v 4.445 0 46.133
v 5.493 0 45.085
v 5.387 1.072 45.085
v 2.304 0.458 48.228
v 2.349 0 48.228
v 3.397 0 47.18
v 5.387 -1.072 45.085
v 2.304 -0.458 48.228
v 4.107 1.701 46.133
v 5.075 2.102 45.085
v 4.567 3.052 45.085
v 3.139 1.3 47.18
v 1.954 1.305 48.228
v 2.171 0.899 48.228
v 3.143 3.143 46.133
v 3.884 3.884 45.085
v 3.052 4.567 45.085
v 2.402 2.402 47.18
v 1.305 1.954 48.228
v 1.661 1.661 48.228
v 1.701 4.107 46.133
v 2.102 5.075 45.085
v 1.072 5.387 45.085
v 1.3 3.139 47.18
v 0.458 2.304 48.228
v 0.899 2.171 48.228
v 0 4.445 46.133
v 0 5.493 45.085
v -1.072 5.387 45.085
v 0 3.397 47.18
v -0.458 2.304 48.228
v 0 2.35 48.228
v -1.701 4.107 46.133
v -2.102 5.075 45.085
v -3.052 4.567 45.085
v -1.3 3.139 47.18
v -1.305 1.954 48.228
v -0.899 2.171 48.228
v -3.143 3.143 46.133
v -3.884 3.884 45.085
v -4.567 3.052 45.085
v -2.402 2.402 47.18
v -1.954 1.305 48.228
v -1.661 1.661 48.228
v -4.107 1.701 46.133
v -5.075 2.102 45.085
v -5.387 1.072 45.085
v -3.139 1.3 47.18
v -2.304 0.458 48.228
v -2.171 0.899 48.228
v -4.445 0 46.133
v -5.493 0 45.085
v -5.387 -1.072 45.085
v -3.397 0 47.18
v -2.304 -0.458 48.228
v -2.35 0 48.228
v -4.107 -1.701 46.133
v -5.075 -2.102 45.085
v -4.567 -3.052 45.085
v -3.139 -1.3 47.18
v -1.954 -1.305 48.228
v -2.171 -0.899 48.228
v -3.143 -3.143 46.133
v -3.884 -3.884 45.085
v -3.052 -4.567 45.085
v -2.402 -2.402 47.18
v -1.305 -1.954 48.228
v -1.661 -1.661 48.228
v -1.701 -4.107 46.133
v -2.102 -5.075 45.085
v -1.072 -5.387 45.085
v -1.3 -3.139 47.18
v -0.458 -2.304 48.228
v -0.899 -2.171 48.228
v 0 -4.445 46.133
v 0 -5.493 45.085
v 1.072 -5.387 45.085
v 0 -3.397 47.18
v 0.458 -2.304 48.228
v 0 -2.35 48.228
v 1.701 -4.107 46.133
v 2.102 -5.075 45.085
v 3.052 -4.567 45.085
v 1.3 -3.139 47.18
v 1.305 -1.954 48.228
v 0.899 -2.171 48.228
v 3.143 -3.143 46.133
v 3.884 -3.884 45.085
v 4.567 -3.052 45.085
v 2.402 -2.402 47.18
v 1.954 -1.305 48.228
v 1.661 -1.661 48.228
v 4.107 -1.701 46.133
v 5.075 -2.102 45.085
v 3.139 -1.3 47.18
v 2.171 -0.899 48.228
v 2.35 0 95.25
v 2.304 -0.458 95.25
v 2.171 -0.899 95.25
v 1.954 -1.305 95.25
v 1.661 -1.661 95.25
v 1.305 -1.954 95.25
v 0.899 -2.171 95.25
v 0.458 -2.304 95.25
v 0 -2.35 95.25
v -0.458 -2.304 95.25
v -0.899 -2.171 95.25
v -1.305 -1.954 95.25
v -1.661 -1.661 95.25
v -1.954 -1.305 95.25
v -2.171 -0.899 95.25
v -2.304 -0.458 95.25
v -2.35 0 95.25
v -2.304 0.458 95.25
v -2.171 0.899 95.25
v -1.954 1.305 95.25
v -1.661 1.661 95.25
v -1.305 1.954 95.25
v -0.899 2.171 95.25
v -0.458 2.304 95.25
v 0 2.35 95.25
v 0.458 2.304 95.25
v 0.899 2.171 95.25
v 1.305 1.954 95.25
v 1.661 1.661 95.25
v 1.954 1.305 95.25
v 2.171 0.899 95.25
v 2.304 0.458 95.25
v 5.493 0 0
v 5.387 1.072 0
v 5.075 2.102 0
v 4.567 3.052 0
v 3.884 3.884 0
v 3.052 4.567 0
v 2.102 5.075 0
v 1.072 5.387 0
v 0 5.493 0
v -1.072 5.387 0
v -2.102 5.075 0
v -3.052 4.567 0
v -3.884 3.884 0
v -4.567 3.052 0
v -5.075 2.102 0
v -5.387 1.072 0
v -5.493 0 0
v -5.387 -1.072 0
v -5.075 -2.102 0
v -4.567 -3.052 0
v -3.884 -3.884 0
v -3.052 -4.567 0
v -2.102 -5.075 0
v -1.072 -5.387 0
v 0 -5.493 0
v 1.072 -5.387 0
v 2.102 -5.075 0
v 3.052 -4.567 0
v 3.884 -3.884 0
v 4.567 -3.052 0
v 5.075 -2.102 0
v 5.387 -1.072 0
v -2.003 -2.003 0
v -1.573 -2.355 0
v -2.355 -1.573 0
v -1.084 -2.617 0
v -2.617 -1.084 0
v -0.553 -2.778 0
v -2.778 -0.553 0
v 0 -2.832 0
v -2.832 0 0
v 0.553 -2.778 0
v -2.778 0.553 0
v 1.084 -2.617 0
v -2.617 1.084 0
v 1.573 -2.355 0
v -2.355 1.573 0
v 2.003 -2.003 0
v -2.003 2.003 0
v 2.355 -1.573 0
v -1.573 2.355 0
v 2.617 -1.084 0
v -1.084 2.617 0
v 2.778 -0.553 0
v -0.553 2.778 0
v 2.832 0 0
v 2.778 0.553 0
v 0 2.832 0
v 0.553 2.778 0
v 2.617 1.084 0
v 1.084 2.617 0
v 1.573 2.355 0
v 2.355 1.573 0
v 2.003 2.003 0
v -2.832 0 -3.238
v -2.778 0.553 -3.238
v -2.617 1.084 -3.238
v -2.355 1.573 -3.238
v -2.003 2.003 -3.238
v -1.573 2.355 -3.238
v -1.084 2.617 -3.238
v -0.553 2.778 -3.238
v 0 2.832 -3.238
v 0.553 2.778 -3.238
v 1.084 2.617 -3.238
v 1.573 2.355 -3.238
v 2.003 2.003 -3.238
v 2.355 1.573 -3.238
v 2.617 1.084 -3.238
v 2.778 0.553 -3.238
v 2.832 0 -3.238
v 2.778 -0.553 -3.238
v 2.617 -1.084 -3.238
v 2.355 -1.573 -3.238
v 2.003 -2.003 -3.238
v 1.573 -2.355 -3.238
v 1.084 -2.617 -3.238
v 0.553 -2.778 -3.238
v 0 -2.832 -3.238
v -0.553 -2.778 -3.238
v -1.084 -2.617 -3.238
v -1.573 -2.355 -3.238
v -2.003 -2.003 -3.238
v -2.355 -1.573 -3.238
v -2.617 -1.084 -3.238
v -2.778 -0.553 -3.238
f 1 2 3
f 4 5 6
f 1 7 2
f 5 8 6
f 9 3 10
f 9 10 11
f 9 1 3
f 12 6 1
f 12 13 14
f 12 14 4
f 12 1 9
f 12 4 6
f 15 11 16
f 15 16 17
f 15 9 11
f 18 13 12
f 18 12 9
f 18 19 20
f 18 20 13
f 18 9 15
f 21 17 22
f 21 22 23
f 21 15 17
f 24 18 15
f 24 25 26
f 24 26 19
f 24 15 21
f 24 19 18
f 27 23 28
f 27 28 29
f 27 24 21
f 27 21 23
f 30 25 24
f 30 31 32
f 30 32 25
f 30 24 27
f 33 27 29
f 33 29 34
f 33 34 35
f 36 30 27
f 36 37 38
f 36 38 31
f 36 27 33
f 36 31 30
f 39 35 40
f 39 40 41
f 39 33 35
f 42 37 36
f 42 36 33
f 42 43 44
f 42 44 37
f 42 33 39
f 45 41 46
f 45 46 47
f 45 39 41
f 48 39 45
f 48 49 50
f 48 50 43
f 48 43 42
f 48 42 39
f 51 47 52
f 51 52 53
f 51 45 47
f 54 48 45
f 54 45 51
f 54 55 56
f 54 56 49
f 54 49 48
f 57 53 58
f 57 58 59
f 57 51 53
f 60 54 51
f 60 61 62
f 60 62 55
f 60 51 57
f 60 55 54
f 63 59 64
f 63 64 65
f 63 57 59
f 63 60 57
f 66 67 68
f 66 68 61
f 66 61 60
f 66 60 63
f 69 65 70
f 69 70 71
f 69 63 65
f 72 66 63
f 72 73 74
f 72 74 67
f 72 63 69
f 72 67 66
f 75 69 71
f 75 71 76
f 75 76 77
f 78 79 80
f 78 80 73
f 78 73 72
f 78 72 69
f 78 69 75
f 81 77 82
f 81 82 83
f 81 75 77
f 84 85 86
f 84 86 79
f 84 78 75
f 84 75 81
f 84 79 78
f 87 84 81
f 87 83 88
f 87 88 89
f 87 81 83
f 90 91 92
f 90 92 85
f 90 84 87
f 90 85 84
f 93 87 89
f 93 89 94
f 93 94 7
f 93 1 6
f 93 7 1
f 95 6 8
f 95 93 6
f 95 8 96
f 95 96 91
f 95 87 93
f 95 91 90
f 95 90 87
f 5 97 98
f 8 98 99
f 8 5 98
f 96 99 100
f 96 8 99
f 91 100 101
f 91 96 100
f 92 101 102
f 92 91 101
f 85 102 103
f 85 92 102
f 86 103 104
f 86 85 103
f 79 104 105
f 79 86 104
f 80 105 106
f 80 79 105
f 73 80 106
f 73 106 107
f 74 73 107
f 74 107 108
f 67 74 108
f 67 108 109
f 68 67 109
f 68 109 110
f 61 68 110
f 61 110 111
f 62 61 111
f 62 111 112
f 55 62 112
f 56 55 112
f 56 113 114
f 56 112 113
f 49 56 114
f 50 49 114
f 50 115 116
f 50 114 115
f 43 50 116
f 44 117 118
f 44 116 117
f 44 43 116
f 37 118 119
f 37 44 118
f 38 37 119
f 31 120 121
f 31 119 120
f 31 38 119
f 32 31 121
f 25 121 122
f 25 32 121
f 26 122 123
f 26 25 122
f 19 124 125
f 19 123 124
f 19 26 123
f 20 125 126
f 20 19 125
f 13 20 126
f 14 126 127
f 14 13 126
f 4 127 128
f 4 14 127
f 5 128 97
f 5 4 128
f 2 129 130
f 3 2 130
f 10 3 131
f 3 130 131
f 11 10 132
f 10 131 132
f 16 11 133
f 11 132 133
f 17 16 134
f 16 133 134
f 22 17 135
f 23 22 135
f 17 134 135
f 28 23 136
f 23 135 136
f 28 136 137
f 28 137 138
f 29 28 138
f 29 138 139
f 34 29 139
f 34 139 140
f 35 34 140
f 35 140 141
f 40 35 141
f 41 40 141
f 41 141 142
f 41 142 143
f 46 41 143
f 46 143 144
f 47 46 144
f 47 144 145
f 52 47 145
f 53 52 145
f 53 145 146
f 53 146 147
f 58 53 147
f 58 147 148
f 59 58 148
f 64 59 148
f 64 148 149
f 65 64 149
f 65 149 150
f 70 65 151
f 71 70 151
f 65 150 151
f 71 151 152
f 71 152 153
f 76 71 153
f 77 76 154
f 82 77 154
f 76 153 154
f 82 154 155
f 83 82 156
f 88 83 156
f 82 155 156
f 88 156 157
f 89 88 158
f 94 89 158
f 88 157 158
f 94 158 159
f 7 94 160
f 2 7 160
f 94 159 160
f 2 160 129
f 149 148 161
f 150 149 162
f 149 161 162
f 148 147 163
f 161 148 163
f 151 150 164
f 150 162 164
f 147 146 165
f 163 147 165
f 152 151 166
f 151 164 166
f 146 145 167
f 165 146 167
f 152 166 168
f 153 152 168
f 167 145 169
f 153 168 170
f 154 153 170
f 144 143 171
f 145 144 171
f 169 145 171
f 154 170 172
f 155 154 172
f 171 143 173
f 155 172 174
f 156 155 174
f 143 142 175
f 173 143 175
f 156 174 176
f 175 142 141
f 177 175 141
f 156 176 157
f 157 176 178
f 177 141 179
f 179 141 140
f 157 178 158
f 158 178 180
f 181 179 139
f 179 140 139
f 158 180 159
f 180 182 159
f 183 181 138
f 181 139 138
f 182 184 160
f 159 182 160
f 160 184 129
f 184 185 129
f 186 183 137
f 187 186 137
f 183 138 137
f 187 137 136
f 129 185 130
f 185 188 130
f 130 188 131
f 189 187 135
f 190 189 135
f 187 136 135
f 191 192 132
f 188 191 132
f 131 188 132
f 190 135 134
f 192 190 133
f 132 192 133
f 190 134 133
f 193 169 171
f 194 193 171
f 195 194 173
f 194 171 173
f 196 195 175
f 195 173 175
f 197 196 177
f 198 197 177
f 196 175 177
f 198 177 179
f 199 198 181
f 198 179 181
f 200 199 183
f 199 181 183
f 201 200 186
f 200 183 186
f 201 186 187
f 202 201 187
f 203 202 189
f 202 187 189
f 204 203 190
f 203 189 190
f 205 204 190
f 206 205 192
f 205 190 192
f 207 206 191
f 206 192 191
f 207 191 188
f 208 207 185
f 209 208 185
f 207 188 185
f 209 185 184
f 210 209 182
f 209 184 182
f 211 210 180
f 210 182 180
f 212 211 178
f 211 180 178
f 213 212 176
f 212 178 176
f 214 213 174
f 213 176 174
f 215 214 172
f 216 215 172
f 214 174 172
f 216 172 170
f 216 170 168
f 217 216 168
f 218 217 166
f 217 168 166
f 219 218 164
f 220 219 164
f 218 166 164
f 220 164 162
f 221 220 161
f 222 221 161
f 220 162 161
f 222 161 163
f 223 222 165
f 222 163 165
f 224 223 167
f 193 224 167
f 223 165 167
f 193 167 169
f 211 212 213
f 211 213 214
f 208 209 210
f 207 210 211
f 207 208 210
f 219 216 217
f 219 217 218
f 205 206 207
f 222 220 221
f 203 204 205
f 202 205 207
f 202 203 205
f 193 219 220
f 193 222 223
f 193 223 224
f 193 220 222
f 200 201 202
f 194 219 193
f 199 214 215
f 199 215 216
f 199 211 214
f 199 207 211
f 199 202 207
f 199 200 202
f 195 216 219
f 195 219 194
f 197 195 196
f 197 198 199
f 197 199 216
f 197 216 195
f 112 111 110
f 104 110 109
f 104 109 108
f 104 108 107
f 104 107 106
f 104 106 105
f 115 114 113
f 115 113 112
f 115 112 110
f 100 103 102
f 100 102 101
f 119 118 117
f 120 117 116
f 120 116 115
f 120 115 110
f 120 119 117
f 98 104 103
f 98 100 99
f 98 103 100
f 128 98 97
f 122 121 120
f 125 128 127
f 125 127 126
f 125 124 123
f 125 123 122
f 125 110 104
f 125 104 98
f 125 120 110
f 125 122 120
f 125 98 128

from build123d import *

# Parameters (mm, degrees)
SKETCH1_R           = 5.49275
BOSS_EXTRUDE1_DEPTH = 49.53
SKETCH2_R           = 2.3495
BOSS_EXTRUDE2_DEPTH = 45.72
CHAMFER1_SIZE       = 4.445
SKETCH3_R           = 2.8321
BOSS_EXTRUDE3_DEPTH = 3.2385


with BuildPart() as part:
    # Sketch1 → Boss-Extrude1 (new body)
    with BuildSketch(Plane.XY):
        Circle(SKETCH1_R)
    extrude(amount=BOSS_EXTRUDE1_DEPTH)

    # Sketch2 → Boss-Extrude2 (add)
    with BuildSketch(Plane.XY.offset(49.53)):
        Circle(SKETCH2_R)
    extrude(amount=BOSS_EXTRUDE2_DEPTH)

    # Chamfer1
    # the kernel refuses this chamfer: 4.445 mm, written as the material it takes off along each edge
    with BuildSketch(Plane(origin=(0, 0, 49.53), x_dir=(1, 0, 0), z_dir=(0, -1, 0))) as chamfer1_piece_1_section:
        Polygon((5.49275, -CHAMFER1_SIZE), (5.49275 - CHAMFER1_SIZE, 0), (5.49275, 0), align=None)
    chamfer1_piece_1 = revolve(axis=Axis((0, 0, 49.53), (0, 0, 1)), mode=Mode.PRIVATE)
    chamfer1_piece_1 = chamfer1_piece_1 - Plane(origin=(0, 0, 46.639044466), x_dir=(1, 0, 0), z_dir=(0, 0, -1)) * Cylinder(2.3495, 22, mode=Mode.PRIVATE)
    add(chamfer1_piece_1, mode=Mode.SUBTRACT)

    # Sketch3 → Boss-Extrude3 (add)
    with BuildSketch(Plane(origin=(0, 0, 0), x_dir=(-1, 0, 0), z_dir=(0, 0, -1))):
        Circle(SKETCH3_R)
    extrude(amount=BOSS_EXTRUDE3_DEPTH)


solid = part.part
